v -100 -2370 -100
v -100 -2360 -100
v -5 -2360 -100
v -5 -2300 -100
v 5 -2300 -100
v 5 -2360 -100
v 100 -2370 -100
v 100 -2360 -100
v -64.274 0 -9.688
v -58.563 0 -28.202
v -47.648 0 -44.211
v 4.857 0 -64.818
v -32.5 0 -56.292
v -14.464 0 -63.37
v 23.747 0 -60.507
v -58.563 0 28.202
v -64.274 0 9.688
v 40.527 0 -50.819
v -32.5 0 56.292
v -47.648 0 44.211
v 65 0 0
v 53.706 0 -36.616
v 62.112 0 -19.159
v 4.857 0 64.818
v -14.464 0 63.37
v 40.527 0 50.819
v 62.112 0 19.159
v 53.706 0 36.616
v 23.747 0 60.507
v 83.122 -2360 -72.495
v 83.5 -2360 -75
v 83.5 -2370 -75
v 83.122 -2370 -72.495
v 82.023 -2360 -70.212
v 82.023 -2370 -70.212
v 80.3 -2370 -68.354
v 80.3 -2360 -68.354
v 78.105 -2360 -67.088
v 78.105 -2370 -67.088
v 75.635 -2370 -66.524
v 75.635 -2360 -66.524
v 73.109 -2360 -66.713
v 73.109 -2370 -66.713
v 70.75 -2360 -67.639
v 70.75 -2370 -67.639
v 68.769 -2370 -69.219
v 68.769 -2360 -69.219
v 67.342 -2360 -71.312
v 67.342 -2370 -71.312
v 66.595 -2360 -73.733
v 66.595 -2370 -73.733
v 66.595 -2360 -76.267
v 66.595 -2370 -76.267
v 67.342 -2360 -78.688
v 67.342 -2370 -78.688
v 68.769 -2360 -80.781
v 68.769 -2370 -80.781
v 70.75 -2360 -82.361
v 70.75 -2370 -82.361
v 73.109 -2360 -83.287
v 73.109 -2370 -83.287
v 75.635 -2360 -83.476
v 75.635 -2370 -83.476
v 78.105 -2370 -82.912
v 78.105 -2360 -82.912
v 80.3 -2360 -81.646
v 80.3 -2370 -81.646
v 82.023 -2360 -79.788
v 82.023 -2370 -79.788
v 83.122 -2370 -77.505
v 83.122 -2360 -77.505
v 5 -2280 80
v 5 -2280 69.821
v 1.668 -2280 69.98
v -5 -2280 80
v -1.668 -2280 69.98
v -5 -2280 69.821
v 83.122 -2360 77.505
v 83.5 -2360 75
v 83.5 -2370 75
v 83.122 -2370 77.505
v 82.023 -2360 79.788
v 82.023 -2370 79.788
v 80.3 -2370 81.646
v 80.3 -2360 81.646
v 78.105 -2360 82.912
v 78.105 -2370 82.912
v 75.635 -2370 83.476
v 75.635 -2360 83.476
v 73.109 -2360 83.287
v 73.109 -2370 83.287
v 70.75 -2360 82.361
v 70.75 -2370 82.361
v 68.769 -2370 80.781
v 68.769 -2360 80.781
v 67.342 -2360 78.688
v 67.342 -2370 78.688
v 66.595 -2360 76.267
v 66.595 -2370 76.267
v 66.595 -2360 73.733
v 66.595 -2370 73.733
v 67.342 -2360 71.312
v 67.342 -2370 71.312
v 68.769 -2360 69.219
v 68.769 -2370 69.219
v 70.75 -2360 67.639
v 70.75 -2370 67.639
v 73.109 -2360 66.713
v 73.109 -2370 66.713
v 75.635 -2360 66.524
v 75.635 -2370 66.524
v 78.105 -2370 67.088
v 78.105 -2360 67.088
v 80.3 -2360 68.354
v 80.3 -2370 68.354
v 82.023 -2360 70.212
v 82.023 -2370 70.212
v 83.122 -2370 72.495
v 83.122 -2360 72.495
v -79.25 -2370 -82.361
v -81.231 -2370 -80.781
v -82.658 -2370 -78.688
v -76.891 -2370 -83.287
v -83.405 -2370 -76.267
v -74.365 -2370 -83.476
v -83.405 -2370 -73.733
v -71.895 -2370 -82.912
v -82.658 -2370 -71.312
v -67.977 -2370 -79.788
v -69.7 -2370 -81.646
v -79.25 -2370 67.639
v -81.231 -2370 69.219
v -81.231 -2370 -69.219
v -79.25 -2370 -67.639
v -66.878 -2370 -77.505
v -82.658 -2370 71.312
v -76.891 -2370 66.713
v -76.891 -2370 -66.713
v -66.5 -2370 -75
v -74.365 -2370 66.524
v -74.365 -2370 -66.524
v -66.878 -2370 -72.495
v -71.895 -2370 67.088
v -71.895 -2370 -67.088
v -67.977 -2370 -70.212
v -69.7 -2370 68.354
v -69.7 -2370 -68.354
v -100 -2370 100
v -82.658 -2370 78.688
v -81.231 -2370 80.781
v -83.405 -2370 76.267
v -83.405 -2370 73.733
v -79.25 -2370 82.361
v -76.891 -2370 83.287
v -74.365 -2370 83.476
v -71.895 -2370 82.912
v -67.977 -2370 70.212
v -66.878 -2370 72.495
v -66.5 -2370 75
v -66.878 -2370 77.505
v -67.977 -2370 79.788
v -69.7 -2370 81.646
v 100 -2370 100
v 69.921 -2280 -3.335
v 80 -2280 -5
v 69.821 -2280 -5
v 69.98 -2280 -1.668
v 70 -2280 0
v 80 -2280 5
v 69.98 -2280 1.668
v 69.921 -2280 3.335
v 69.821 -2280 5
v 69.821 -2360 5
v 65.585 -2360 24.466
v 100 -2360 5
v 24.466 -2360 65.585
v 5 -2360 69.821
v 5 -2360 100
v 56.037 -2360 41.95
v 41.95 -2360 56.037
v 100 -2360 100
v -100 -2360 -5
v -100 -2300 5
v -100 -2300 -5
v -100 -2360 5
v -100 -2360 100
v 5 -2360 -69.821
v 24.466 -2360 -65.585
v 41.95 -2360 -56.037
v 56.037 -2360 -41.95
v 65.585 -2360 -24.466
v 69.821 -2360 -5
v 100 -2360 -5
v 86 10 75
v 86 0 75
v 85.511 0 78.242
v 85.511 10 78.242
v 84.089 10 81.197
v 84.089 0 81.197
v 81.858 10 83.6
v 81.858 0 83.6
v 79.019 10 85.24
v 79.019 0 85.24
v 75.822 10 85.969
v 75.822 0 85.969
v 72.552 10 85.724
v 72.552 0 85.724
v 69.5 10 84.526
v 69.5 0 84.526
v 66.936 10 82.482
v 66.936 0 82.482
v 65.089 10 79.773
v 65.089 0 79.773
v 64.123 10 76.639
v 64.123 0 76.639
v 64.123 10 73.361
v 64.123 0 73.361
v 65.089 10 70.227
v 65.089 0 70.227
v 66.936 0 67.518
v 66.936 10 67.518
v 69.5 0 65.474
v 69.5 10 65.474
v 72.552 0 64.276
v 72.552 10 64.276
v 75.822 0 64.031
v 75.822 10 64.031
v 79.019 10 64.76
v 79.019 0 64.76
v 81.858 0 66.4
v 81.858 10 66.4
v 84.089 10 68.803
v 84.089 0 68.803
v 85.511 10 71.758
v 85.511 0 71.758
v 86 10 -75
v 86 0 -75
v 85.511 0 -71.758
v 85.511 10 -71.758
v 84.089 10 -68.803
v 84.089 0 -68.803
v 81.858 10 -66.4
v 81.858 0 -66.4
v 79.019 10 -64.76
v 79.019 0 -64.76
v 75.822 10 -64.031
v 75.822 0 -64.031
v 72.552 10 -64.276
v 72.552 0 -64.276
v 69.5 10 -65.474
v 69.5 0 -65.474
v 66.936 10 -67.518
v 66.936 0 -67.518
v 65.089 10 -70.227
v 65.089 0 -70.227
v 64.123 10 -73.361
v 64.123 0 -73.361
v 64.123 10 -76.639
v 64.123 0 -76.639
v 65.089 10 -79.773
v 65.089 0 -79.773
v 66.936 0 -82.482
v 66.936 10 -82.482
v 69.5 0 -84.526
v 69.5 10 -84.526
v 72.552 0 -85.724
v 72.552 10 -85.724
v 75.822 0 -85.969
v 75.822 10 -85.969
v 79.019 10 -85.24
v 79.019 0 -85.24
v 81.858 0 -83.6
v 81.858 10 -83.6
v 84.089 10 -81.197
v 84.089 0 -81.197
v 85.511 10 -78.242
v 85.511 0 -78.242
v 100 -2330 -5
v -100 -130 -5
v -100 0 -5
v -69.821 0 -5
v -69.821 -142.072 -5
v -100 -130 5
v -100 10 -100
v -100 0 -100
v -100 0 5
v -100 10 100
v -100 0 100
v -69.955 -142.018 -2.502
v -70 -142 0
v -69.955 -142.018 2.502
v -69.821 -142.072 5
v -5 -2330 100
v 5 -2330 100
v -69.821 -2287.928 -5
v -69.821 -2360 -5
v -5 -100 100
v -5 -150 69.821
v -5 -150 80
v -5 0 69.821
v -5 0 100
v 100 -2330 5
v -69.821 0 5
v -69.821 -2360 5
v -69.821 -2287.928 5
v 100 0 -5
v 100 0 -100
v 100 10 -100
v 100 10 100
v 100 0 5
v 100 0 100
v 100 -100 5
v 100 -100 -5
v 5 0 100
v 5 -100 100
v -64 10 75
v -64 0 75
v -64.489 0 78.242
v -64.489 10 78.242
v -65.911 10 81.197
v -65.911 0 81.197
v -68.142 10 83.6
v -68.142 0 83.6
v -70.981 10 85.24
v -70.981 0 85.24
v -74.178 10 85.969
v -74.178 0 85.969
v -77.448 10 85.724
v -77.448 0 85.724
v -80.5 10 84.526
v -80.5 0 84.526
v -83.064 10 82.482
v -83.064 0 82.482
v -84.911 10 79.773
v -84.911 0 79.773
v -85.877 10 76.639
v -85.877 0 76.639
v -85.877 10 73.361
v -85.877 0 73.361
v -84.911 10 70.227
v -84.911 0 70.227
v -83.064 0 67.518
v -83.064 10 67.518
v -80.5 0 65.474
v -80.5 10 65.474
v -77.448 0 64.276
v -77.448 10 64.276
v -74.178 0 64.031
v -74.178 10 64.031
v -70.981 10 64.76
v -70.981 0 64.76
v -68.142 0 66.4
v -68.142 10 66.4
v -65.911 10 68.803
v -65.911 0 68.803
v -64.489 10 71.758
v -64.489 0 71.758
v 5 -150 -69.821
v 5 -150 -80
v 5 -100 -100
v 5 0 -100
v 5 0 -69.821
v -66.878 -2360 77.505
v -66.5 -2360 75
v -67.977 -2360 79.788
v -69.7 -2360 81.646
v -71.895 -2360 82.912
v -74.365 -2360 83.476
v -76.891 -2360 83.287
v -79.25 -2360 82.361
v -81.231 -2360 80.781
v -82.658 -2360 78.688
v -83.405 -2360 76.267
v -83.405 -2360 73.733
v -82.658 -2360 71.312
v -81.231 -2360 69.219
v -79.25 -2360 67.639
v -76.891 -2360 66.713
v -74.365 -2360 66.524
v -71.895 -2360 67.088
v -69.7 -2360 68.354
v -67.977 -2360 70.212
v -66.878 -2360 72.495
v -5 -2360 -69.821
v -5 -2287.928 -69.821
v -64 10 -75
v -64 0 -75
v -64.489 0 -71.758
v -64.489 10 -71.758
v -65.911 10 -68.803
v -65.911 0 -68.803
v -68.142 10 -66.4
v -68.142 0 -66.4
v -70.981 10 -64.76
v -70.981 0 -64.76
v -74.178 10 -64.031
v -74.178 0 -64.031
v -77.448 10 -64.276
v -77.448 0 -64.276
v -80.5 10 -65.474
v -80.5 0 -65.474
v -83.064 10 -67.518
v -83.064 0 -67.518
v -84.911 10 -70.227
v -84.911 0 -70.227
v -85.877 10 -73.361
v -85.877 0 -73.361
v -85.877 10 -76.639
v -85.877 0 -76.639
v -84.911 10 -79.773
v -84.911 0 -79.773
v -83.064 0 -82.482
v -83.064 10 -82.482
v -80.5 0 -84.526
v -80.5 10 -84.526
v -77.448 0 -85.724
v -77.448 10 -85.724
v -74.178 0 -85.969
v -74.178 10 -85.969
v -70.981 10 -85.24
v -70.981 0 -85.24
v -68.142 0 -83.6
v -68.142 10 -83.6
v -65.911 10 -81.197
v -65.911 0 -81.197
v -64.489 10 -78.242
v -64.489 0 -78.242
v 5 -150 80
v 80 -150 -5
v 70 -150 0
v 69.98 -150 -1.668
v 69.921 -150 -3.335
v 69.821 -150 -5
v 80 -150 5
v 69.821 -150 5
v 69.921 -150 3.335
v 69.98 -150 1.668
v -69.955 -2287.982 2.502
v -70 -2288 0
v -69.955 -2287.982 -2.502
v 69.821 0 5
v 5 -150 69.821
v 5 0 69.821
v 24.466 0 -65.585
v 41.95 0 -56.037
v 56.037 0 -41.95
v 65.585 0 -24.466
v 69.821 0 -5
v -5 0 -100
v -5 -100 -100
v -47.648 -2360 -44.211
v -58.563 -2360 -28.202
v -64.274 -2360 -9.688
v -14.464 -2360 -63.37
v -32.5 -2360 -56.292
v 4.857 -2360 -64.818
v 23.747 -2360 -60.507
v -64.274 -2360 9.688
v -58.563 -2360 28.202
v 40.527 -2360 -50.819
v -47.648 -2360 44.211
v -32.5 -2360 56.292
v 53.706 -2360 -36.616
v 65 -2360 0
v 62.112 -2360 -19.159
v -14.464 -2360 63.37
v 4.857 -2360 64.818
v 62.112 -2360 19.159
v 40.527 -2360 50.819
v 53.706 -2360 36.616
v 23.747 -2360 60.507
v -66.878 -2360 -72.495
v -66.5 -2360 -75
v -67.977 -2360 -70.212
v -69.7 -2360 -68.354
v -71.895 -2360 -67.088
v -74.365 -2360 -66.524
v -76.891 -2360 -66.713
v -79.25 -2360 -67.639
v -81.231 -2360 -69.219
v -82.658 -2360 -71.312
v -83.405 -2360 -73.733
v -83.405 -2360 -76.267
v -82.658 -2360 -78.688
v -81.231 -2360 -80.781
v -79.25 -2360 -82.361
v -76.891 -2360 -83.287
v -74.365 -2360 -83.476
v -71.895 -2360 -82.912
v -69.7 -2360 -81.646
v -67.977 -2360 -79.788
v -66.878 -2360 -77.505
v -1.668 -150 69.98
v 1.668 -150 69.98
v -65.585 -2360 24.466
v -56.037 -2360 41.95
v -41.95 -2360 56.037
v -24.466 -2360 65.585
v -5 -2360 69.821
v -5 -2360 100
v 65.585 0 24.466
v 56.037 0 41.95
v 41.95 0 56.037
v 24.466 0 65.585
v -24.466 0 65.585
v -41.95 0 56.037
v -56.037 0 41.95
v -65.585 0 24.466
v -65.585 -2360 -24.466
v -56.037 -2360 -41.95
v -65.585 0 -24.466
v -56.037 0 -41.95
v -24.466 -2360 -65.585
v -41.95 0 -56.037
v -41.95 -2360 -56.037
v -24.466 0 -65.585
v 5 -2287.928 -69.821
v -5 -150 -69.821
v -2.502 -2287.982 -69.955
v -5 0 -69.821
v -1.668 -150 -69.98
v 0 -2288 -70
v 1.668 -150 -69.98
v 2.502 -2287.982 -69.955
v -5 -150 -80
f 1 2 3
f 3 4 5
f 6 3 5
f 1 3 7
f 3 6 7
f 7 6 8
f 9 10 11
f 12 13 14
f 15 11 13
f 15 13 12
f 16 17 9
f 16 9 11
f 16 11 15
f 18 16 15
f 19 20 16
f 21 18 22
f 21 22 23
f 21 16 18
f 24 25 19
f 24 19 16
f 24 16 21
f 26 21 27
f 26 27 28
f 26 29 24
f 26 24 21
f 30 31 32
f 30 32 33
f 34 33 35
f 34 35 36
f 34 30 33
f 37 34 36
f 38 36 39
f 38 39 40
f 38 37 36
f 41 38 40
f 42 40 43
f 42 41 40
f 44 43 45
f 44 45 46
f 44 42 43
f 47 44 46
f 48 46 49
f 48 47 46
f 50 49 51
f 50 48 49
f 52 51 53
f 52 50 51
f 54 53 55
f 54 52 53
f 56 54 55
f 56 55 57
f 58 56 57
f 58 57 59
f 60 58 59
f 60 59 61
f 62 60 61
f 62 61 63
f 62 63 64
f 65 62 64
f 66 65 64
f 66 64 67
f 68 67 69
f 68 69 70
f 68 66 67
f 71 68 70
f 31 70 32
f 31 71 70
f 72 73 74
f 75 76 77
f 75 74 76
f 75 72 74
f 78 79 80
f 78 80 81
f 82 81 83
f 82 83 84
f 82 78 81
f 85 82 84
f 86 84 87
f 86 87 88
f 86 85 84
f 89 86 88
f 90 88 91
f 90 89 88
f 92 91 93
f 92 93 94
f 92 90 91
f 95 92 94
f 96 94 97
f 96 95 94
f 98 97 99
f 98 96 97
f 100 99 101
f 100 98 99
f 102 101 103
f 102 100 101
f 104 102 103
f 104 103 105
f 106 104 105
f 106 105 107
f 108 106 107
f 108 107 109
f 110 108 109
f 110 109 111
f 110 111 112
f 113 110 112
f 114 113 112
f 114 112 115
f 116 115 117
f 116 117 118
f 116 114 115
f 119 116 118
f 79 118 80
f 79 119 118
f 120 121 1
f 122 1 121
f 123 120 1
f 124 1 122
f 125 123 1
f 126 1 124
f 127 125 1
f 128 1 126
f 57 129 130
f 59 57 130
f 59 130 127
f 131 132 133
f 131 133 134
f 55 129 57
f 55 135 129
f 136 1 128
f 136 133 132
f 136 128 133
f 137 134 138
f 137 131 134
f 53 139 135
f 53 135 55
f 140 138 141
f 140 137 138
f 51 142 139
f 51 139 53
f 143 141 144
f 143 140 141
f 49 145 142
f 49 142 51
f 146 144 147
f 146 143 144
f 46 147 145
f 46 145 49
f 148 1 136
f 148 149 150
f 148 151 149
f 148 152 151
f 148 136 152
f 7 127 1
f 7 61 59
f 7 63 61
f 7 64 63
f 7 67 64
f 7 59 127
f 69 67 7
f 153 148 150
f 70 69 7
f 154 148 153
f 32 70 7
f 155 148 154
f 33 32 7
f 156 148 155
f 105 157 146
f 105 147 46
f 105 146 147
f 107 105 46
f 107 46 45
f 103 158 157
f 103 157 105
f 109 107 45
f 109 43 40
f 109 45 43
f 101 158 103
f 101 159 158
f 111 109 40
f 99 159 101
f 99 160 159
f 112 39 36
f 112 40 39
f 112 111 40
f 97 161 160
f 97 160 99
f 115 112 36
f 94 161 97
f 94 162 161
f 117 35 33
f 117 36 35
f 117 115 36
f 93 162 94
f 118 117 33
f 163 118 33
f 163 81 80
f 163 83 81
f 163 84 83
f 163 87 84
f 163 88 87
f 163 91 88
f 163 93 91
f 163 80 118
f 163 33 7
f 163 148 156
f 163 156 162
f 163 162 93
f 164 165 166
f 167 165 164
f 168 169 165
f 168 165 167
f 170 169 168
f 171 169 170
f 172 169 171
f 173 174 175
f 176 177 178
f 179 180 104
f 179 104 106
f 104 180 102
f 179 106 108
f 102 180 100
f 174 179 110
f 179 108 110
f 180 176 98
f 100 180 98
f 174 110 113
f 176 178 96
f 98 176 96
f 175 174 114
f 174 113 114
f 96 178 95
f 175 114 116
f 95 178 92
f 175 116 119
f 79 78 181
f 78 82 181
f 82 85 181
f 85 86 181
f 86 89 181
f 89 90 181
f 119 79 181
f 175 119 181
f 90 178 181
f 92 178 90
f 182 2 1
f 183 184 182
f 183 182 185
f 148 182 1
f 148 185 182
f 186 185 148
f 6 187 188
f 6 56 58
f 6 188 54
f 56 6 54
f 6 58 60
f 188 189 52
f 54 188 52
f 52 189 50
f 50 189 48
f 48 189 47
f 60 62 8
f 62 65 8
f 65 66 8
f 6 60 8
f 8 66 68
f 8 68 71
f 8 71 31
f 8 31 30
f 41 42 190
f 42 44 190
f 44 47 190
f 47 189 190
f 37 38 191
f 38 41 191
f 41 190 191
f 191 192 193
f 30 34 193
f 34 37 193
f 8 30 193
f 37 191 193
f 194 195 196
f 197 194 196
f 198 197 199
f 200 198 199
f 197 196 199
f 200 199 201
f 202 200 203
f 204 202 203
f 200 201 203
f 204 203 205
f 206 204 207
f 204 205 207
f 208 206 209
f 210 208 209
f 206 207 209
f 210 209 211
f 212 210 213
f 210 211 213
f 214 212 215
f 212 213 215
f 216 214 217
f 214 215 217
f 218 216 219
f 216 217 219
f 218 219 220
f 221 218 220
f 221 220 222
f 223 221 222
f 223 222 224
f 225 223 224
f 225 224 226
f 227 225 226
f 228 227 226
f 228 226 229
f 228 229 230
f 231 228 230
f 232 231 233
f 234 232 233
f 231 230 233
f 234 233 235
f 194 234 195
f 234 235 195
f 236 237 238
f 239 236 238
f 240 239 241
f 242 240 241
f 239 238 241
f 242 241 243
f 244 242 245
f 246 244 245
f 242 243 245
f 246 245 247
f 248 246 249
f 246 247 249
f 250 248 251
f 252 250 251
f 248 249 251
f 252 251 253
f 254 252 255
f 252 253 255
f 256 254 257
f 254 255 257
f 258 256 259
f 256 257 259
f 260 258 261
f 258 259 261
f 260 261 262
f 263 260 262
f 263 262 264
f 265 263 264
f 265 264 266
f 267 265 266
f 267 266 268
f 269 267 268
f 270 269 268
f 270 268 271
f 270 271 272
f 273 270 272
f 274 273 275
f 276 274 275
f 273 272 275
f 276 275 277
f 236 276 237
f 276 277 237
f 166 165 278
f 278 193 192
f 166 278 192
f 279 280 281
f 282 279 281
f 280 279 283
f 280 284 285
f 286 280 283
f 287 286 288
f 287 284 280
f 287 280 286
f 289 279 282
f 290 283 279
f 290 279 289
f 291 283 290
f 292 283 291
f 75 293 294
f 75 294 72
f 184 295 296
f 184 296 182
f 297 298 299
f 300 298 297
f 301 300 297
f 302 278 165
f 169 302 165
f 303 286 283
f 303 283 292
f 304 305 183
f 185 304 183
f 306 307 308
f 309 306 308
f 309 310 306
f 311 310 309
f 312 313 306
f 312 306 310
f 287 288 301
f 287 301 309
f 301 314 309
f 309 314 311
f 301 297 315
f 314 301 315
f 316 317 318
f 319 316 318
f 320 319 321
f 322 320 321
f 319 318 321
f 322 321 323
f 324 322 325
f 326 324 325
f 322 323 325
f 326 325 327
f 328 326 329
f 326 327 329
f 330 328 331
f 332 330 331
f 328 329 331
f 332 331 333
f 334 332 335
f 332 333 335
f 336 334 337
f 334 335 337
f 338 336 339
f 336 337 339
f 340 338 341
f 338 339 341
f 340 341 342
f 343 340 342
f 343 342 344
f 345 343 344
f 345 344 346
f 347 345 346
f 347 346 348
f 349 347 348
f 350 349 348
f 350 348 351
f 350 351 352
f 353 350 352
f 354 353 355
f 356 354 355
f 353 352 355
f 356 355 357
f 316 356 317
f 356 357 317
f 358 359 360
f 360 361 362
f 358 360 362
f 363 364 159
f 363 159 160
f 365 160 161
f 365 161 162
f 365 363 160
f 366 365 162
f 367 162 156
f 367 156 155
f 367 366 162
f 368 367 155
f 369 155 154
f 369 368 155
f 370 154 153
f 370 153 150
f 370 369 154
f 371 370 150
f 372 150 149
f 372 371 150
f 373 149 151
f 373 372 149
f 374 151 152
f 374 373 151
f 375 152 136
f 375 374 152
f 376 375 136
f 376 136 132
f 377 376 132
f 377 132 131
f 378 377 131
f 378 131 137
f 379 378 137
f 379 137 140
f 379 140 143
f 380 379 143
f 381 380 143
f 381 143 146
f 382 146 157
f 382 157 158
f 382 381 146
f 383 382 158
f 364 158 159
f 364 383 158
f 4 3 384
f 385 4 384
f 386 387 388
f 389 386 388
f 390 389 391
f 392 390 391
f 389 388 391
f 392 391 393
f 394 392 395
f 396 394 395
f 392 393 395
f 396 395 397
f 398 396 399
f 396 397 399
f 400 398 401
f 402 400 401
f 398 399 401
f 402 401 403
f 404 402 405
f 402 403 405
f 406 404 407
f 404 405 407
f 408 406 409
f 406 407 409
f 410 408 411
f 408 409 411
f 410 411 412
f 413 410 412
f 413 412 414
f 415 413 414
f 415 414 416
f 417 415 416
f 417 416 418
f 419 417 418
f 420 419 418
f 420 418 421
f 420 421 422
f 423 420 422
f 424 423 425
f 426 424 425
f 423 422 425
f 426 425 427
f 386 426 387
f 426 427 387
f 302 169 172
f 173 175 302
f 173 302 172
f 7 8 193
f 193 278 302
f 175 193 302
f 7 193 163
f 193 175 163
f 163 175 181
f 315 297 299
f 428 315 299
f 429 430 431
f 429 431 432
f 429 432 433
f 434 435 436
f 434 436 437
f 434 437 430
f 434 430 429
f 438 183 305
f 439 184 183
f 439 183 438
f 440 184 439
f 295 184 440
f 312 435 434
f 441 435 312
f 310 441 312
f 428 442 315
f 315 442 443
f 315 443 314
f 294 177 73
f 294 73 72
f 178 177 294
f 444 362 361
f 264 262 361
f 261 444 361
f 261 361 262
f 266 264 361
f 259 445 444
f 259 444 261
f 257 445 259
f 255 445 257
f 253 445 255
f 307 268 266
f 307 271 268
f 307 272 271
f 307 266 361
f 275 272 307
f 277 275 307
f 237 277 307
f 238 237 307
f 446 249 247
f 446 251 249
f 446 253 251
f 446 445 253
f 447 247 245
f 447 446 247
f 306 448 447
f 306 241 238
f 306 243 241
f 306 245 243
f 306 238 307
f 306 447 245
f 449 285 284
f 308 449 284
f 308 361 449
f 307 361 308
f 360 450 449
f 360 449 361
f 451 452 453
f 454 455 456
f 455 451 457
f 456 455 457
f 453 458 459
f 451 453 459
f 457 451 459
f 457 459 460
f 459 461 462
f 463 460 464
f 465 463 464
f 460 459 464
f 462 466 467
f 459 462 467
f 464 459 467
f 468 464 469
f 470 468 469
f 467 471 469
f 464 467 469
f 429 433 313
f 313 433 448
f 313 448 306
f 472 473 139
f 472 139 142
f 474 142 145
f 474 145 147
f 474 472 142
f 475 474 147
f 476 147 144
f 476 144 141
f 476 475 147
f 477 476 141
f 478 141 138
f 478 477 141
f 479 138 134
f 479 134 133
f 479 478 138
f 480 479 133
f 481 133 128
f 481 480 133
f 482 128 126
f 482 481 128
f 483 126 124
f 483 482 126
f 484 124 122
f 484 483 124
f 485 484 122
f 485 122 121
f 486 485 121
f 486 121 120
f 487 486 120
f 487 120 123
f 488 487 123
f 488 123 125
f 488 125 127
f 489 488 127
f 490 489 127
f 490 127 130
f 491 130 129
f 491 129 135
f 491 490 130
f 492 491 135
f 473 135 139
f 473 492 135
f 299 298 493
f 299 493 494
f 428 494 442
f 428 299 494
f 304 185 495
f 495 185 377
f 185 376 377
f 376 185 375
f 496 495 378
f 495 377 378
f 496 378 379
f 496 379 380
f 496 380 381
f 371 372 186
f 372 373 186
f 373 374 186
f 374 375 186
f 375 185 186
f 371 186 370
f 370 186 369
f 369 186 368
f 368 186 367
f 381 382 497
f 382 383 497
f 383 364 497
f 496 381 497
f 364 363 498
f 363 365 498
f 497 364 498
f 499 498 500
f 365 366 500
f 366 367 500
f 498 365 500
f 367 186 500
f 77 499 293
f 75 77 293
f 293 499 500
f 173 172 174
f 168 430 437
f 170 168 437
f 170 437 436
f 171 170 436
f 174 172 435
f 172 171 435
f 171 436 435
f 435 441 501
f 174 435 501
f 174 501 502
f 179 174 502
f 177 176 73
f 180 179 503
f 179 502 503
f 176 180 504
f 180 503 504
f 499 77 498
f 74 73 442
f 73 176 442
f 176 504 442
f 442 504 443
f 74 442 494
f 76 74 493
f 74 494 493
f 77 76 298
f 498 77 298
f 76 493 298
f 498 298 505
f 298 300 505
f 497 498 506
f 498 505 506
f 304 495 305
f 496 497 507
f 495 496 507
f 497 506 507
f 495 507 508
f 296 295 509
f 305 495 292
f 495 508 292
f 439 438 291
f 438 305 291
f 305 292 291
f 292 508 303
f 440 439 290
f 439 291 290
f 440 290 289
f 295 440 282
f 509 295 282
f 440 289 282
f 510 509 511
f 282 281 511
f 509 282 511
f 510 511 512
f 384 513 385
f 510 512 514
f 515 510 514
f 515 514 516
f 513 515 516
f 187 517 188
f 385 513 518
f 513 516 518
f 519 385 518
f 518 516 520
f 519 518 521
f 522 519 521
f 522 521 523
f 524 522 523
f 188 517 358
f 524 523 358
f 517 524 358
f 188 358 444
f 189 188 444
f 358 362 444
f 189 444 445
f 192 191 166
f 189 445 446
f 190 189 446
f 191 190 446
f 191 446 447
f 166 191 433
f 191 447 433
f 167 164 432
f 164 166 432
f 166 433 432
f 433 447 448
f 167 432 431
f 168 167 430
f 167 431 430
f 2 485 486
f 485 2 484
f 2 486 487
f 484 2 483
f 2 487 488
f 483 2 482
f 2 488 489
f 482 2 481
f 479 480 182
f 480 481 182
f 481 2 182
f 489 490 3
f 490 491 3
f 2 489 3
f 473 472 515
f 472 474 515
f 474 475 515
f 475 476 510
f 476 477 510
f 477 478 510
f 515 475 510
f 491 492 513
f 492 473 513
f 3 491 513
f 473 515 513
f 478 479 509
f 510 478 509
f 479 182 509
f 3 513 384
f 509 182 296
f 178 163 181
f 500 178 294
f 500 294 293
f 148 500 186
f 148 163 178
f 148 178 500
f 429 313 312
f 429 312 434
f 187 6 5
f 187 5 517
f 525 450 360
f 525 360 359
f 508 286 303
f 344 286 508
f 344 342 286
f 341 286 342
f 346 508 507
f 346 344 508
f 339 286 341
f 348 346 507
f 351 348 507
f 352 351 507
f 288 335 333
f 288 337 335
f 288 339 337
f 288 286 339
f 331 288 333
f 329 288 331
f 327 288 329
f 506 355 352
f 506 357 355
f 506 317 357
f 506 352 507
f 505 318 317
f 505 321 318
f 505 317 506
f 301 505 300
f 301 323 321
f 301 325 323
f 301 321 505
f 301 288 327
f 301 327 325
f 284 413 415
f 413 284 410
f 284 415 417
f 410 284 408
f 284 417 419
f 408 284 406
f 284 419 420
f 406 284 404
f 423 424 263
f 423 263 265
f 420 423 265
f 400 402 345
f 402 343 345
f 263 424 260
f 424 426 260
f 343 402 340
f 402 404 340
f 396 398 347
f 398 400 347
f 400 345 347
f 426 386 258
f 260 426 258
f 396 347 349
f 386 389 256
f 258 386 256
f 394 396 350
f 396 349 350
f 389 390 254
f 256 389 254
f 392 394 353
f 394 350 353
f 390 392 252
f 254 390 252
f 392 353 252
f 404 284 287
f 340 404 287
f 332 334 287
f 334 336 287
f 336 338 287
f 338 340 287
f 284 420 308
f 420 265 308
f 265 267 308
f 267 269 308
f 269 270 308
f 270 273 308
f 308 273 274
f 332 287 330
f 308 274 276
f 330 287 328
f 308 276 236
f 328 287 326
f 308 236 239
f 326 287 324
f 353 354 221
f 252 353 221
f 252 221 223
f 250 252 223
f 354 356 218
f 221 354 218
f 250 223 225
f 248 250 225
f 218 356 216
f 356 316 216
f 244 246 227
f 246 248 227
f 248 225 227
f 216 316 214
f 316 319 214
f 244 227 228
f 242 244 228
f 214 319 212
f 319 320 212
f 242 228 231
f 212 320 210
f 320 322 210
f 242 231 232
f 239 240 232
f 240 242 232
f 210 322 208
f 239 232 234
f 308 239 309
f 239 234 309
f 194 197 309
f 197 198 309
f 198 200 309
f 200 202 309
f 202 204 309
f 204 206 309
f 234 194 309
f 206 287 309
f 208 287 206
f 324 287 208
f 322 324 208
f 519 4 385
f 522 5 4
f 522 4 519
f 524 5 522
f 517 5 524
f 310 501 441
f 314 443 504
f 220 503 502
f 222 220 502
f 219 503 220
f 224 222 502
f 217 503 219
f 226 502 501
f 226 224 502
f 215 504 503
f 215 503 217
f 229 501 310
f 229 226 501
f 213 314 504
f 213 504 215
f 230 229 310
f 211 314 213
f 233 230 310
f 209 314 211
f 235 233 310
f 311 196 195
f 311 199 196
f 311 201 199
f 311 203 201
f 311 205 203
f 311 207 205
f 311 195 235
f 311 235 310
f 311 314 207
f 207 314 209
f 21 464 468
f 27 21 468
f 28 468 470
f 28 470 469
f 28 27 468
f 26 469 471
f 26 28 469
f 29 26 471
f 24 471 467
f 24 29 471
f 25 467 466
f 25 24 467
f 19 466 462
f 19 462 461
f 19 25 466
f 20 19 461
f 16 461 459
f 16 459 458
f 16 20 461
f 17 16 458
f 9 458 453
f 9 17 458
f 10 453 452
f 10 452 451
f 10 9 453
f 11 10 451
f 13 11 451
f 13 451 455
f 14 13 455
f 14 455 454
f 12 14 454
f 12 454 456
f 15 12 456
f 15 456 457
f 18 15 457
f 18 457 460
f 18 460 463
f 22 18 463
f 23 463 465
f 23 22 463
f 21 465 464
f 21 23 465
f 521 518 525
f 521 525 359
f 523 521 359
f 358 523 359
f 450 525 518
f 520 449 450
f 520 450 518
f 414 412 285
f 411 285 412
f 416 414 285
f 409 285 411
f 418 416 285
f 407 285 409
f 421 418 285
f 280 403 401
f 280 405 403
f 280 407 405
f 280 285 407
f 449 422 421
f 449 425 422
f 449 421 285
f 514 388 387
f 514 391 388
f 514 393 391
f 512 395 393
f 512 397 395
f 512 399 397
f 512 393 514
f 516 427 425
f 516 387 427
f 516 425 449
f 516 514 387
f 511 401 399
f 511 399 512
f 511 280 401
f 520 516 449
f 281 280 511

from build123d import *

# Parameters (mm, degrees)
F0_R          = 70
F0_R_2        = 65
F1_DEPTH      = 2360
F2_W          = 200
F2_H          = 200
F2_R          = 11
F3_DEPTH      = 10
F4_W          = 30.1787997812
F4_H          = 10
F4_W_2        = 10
F4_H_2        = 30.1787997812
F5_DEPTH      = 150
F6_T1_DEPTH   = 269.311363913
F6_T3_DEPTH   = 269.311363913
F6_T8_DEPTH   = 269.311363913
F6_S9_R       = 70
F6_T10_DEPTH  = 139
F8_W          = 200
F8_H          = 200
F8_R          = 8.5
F9_DEPTH      = 10
F10_W         = 10
F10_H         = 30.1787997812
F10_W_2       = 30.1787997812
F10_H_2       = 10
F11_DEPTH     = 80
F12_T1_DEPTH  = 269.311363913
F12_T3_DEPTH  = 269.311363913
F12_T8_DEPTH  = 269.311363913
F12_S9_R      = 70
F12_T10_DEPTH = 139
F12_T14_DEPTH = 269.311363913
F12_S15_R     = 70
F12_T16_DEPTH = 139


# Not quite as in the source:
# - a fillet or chamfer that OpenCascade refuses, or shapes differently, is made with other operations: its cross-section is extruded or revolved along the edge and cut away or added


with BuildPart() as f1:
    # F0 (on Front) → F1 (new body)
    with BuildSketch(Plane.XZ):
        Circle(F0_R)
        Circle(F0_R_2, mode=Mode.SUBTRACT)
    extrude(amount=F1_DEPTH)

    # F2 (on Front) → F3 (join)
    with BuildSketch(Plane.XZ):
        Rectangle(F2_W, F2_H)
        with Locations((-75, -75)):
            Circle(F2_R, mode=Mode.SUBTRACT)
        with Locations((75, -75)):
            Circle(F2_R, mode=Mode.SUBTRACT)
        with Locations((-75, 75)):
            Circle(F2_R, mode=Mode.SUBTRACT)
        with Locations((75, 75)):
            Circle(F2_R, mode=Mode.SUBTRACT)
    extrude(amount=-F3_DEPTH)

    # F4 (on Front) → F5 (join)
    with BuildSketch(Plane.XZ):
        with Locations((-84.9106001094, 0)):
            Rectangle(F4_W, F4_H)
        with Locations((0, 84.9106001094)):
            Rectangle(F4_W_2, F4_H_2)
        with Locations((84.9106001094, 0)):
            Rectangle(F4_W, F4_H)
        with Locations((0, -84.9106001094)):
            Rectangle(F4_W_2, F4_H_2)
    extrude(amount=F5_DEPTH)

    # F6: chamfer of 50 x 20 on 4 edges, made by hand

    # F6_s2 → F6_t1 (cut)
    with BuildSketch(Plane.YZ.offset(-134.6556819565)):
        Polygon((-100, 100), (-150, 80), (-150, 100), align=None)
        Polygon((-100, -100), (-150, -80), (-150, -100), align=None)
    extrude(amount=F6_T1_DEPTH, mode=Mode.SUBTRACT)

    # F6_s4 → F6_t3 (cut)
    with BuildSketch(Plane.XY.offset(-134.6556819565)):
        Polygon((100, -100), (80, -150), (100, -150), align=None)
    extrude(amount=F6_T3_DEPTH, mode=Mode.SUBTRACT)


with BuildPart() as f6_tool6:
    # F6_s7 → F6_t8 (new body)
    with BuildSketch(Plane.XY.offset(134.6556819565)):
        Polygon((-100, -130), (-50, -150), (-100, -150), align=None)
    extrude(amount=-F6_T8_DEPTH)

    # F6_s9 → F6_t10 (cut, symmetric)
    with BuildSketch(Plane.XZ.offset(140)):
        Circle(F6_S9_R)
    extrude(amount=F6_T10_DEPTH, both=True, mode=Mode.SUBTRACT)


with BuildPart() as f1_1:
    add(f1.part)

    # F6_t5: cut F6_tool6
    add(f6_tool6.part, mode=Mode.SUBTRACT)

    # F8 (on offset) → F9 (join)
    with BuildSketch(Plane.XZ.offset(2360)):
        Rectangle(F8_W, F8_H)
        with Locations((-75, -75)):
            Circle(F8_R, mode=Mode.SUBTRACT)
        with Locations((75, -75)):
            Circle(F8_R, mode=Mode.SUBTRACT)
        with Locations((-75, 75)):
            Circle(F8_R, mode=Mode.SUBTRACT)
        with Locations((75, 75)):
            Circle(F8_R, mode=Mode.SUBTRACT)
    extrude(amount=F9_DEPTH)

    # F10 (on face) → F11 (join)
    with BuildSketch(Plane(origin=(0, -2360, 0), x_dir=(-1, 0, 0), z_dir=(0, 1, 0))):
        with Locations((0, 84.9106001094)):
            Rectangle(F10_W, F10_H)
        with Locations((84.9106001094, 0)):
            Rectangle(F10_W_2, F10_H_2)
        with Locations((0, -84.9106001094)):
            Rectangle(F10_W, F10_H)
        with Locations((-84.9106001094, 0)):
            Rectangle(F10_W_2, F10_H_2)
    extrude(amount=F11_DEPTH)

    # F12: chamfer of 20 x 50 on 4 edges, made by hand

    # F12_s2 → F12_t1 (cut)
    with BuildSketch(Plane.YZ.offset(-134.6556819565)):
        Polygon((-2330, 100), (-2280, 80), (-2280, 100), align=None)
    extrude(amount=F12_T1_DEPTH, mode=Mode.SUBTRACT)

    # F12_s4 → F12_t3 (cut)
    with BuildSketch(Plane.XY.offset(-134.6556819565)):
        Polygon((100, -2330), (80, -2280), (100, -2280), align=None)
    extrude(amount=F12_T3_DEPTH, mode=Mode.SUBTRACT)


with BuildPart() as f12_tool6:
    # F12_s7 → F12_t8 (new body)
    with BuildSketch(Plane.XY.offset(-134.6556819565)):
        Polygon((-100, -2300), (-50, -2280), (-100, -2280), align=None)
    extrude(amount=F12_T8_DEPTH)

    # F12_s9 → F12_t10 (cut, symmetric)
    with BuildSketch(Plane.XZ.offset(2290)):
        Circle(F12_S9_R)
    extrude(amount=F12_T10_DEPTH, both=True, mode=Mode.SUBTRACT)


with BuildPart() as f1_2:
    add(f1_1.part)

    # F12_t5: cut F12_tool6
    add(f12_tool6.part, mode=Mode.SUBTRACT)


with BuildPart() as f12_tool12:
    # F12_s13 → F12_t14 (new body)
    with BuildSketch(Plane.YZ.offset(134.6556819565)):
        Polygon((-2300, -100), (-2280, -50), (-2280, -100), align=None)
    extrude(amount=-F12_T14_DEPTH)

    # F12_s15 → F12_t16 (cut, symmetric)
    with BuildSketch(Plane.XZ.offset(2290)):
        Circle(F12_S15_R)
    extrude(amount=F12_T16_DEPTH, both=True, mode=Mode.SUBTRACT)


with BuildPart() as f1_3:
    add(f1_2.part)

    # F12_t11: cut F12_tool12
    add(f12_tool12.part, mode=Mode.SUBTRACT)


solid = f1_3.part
